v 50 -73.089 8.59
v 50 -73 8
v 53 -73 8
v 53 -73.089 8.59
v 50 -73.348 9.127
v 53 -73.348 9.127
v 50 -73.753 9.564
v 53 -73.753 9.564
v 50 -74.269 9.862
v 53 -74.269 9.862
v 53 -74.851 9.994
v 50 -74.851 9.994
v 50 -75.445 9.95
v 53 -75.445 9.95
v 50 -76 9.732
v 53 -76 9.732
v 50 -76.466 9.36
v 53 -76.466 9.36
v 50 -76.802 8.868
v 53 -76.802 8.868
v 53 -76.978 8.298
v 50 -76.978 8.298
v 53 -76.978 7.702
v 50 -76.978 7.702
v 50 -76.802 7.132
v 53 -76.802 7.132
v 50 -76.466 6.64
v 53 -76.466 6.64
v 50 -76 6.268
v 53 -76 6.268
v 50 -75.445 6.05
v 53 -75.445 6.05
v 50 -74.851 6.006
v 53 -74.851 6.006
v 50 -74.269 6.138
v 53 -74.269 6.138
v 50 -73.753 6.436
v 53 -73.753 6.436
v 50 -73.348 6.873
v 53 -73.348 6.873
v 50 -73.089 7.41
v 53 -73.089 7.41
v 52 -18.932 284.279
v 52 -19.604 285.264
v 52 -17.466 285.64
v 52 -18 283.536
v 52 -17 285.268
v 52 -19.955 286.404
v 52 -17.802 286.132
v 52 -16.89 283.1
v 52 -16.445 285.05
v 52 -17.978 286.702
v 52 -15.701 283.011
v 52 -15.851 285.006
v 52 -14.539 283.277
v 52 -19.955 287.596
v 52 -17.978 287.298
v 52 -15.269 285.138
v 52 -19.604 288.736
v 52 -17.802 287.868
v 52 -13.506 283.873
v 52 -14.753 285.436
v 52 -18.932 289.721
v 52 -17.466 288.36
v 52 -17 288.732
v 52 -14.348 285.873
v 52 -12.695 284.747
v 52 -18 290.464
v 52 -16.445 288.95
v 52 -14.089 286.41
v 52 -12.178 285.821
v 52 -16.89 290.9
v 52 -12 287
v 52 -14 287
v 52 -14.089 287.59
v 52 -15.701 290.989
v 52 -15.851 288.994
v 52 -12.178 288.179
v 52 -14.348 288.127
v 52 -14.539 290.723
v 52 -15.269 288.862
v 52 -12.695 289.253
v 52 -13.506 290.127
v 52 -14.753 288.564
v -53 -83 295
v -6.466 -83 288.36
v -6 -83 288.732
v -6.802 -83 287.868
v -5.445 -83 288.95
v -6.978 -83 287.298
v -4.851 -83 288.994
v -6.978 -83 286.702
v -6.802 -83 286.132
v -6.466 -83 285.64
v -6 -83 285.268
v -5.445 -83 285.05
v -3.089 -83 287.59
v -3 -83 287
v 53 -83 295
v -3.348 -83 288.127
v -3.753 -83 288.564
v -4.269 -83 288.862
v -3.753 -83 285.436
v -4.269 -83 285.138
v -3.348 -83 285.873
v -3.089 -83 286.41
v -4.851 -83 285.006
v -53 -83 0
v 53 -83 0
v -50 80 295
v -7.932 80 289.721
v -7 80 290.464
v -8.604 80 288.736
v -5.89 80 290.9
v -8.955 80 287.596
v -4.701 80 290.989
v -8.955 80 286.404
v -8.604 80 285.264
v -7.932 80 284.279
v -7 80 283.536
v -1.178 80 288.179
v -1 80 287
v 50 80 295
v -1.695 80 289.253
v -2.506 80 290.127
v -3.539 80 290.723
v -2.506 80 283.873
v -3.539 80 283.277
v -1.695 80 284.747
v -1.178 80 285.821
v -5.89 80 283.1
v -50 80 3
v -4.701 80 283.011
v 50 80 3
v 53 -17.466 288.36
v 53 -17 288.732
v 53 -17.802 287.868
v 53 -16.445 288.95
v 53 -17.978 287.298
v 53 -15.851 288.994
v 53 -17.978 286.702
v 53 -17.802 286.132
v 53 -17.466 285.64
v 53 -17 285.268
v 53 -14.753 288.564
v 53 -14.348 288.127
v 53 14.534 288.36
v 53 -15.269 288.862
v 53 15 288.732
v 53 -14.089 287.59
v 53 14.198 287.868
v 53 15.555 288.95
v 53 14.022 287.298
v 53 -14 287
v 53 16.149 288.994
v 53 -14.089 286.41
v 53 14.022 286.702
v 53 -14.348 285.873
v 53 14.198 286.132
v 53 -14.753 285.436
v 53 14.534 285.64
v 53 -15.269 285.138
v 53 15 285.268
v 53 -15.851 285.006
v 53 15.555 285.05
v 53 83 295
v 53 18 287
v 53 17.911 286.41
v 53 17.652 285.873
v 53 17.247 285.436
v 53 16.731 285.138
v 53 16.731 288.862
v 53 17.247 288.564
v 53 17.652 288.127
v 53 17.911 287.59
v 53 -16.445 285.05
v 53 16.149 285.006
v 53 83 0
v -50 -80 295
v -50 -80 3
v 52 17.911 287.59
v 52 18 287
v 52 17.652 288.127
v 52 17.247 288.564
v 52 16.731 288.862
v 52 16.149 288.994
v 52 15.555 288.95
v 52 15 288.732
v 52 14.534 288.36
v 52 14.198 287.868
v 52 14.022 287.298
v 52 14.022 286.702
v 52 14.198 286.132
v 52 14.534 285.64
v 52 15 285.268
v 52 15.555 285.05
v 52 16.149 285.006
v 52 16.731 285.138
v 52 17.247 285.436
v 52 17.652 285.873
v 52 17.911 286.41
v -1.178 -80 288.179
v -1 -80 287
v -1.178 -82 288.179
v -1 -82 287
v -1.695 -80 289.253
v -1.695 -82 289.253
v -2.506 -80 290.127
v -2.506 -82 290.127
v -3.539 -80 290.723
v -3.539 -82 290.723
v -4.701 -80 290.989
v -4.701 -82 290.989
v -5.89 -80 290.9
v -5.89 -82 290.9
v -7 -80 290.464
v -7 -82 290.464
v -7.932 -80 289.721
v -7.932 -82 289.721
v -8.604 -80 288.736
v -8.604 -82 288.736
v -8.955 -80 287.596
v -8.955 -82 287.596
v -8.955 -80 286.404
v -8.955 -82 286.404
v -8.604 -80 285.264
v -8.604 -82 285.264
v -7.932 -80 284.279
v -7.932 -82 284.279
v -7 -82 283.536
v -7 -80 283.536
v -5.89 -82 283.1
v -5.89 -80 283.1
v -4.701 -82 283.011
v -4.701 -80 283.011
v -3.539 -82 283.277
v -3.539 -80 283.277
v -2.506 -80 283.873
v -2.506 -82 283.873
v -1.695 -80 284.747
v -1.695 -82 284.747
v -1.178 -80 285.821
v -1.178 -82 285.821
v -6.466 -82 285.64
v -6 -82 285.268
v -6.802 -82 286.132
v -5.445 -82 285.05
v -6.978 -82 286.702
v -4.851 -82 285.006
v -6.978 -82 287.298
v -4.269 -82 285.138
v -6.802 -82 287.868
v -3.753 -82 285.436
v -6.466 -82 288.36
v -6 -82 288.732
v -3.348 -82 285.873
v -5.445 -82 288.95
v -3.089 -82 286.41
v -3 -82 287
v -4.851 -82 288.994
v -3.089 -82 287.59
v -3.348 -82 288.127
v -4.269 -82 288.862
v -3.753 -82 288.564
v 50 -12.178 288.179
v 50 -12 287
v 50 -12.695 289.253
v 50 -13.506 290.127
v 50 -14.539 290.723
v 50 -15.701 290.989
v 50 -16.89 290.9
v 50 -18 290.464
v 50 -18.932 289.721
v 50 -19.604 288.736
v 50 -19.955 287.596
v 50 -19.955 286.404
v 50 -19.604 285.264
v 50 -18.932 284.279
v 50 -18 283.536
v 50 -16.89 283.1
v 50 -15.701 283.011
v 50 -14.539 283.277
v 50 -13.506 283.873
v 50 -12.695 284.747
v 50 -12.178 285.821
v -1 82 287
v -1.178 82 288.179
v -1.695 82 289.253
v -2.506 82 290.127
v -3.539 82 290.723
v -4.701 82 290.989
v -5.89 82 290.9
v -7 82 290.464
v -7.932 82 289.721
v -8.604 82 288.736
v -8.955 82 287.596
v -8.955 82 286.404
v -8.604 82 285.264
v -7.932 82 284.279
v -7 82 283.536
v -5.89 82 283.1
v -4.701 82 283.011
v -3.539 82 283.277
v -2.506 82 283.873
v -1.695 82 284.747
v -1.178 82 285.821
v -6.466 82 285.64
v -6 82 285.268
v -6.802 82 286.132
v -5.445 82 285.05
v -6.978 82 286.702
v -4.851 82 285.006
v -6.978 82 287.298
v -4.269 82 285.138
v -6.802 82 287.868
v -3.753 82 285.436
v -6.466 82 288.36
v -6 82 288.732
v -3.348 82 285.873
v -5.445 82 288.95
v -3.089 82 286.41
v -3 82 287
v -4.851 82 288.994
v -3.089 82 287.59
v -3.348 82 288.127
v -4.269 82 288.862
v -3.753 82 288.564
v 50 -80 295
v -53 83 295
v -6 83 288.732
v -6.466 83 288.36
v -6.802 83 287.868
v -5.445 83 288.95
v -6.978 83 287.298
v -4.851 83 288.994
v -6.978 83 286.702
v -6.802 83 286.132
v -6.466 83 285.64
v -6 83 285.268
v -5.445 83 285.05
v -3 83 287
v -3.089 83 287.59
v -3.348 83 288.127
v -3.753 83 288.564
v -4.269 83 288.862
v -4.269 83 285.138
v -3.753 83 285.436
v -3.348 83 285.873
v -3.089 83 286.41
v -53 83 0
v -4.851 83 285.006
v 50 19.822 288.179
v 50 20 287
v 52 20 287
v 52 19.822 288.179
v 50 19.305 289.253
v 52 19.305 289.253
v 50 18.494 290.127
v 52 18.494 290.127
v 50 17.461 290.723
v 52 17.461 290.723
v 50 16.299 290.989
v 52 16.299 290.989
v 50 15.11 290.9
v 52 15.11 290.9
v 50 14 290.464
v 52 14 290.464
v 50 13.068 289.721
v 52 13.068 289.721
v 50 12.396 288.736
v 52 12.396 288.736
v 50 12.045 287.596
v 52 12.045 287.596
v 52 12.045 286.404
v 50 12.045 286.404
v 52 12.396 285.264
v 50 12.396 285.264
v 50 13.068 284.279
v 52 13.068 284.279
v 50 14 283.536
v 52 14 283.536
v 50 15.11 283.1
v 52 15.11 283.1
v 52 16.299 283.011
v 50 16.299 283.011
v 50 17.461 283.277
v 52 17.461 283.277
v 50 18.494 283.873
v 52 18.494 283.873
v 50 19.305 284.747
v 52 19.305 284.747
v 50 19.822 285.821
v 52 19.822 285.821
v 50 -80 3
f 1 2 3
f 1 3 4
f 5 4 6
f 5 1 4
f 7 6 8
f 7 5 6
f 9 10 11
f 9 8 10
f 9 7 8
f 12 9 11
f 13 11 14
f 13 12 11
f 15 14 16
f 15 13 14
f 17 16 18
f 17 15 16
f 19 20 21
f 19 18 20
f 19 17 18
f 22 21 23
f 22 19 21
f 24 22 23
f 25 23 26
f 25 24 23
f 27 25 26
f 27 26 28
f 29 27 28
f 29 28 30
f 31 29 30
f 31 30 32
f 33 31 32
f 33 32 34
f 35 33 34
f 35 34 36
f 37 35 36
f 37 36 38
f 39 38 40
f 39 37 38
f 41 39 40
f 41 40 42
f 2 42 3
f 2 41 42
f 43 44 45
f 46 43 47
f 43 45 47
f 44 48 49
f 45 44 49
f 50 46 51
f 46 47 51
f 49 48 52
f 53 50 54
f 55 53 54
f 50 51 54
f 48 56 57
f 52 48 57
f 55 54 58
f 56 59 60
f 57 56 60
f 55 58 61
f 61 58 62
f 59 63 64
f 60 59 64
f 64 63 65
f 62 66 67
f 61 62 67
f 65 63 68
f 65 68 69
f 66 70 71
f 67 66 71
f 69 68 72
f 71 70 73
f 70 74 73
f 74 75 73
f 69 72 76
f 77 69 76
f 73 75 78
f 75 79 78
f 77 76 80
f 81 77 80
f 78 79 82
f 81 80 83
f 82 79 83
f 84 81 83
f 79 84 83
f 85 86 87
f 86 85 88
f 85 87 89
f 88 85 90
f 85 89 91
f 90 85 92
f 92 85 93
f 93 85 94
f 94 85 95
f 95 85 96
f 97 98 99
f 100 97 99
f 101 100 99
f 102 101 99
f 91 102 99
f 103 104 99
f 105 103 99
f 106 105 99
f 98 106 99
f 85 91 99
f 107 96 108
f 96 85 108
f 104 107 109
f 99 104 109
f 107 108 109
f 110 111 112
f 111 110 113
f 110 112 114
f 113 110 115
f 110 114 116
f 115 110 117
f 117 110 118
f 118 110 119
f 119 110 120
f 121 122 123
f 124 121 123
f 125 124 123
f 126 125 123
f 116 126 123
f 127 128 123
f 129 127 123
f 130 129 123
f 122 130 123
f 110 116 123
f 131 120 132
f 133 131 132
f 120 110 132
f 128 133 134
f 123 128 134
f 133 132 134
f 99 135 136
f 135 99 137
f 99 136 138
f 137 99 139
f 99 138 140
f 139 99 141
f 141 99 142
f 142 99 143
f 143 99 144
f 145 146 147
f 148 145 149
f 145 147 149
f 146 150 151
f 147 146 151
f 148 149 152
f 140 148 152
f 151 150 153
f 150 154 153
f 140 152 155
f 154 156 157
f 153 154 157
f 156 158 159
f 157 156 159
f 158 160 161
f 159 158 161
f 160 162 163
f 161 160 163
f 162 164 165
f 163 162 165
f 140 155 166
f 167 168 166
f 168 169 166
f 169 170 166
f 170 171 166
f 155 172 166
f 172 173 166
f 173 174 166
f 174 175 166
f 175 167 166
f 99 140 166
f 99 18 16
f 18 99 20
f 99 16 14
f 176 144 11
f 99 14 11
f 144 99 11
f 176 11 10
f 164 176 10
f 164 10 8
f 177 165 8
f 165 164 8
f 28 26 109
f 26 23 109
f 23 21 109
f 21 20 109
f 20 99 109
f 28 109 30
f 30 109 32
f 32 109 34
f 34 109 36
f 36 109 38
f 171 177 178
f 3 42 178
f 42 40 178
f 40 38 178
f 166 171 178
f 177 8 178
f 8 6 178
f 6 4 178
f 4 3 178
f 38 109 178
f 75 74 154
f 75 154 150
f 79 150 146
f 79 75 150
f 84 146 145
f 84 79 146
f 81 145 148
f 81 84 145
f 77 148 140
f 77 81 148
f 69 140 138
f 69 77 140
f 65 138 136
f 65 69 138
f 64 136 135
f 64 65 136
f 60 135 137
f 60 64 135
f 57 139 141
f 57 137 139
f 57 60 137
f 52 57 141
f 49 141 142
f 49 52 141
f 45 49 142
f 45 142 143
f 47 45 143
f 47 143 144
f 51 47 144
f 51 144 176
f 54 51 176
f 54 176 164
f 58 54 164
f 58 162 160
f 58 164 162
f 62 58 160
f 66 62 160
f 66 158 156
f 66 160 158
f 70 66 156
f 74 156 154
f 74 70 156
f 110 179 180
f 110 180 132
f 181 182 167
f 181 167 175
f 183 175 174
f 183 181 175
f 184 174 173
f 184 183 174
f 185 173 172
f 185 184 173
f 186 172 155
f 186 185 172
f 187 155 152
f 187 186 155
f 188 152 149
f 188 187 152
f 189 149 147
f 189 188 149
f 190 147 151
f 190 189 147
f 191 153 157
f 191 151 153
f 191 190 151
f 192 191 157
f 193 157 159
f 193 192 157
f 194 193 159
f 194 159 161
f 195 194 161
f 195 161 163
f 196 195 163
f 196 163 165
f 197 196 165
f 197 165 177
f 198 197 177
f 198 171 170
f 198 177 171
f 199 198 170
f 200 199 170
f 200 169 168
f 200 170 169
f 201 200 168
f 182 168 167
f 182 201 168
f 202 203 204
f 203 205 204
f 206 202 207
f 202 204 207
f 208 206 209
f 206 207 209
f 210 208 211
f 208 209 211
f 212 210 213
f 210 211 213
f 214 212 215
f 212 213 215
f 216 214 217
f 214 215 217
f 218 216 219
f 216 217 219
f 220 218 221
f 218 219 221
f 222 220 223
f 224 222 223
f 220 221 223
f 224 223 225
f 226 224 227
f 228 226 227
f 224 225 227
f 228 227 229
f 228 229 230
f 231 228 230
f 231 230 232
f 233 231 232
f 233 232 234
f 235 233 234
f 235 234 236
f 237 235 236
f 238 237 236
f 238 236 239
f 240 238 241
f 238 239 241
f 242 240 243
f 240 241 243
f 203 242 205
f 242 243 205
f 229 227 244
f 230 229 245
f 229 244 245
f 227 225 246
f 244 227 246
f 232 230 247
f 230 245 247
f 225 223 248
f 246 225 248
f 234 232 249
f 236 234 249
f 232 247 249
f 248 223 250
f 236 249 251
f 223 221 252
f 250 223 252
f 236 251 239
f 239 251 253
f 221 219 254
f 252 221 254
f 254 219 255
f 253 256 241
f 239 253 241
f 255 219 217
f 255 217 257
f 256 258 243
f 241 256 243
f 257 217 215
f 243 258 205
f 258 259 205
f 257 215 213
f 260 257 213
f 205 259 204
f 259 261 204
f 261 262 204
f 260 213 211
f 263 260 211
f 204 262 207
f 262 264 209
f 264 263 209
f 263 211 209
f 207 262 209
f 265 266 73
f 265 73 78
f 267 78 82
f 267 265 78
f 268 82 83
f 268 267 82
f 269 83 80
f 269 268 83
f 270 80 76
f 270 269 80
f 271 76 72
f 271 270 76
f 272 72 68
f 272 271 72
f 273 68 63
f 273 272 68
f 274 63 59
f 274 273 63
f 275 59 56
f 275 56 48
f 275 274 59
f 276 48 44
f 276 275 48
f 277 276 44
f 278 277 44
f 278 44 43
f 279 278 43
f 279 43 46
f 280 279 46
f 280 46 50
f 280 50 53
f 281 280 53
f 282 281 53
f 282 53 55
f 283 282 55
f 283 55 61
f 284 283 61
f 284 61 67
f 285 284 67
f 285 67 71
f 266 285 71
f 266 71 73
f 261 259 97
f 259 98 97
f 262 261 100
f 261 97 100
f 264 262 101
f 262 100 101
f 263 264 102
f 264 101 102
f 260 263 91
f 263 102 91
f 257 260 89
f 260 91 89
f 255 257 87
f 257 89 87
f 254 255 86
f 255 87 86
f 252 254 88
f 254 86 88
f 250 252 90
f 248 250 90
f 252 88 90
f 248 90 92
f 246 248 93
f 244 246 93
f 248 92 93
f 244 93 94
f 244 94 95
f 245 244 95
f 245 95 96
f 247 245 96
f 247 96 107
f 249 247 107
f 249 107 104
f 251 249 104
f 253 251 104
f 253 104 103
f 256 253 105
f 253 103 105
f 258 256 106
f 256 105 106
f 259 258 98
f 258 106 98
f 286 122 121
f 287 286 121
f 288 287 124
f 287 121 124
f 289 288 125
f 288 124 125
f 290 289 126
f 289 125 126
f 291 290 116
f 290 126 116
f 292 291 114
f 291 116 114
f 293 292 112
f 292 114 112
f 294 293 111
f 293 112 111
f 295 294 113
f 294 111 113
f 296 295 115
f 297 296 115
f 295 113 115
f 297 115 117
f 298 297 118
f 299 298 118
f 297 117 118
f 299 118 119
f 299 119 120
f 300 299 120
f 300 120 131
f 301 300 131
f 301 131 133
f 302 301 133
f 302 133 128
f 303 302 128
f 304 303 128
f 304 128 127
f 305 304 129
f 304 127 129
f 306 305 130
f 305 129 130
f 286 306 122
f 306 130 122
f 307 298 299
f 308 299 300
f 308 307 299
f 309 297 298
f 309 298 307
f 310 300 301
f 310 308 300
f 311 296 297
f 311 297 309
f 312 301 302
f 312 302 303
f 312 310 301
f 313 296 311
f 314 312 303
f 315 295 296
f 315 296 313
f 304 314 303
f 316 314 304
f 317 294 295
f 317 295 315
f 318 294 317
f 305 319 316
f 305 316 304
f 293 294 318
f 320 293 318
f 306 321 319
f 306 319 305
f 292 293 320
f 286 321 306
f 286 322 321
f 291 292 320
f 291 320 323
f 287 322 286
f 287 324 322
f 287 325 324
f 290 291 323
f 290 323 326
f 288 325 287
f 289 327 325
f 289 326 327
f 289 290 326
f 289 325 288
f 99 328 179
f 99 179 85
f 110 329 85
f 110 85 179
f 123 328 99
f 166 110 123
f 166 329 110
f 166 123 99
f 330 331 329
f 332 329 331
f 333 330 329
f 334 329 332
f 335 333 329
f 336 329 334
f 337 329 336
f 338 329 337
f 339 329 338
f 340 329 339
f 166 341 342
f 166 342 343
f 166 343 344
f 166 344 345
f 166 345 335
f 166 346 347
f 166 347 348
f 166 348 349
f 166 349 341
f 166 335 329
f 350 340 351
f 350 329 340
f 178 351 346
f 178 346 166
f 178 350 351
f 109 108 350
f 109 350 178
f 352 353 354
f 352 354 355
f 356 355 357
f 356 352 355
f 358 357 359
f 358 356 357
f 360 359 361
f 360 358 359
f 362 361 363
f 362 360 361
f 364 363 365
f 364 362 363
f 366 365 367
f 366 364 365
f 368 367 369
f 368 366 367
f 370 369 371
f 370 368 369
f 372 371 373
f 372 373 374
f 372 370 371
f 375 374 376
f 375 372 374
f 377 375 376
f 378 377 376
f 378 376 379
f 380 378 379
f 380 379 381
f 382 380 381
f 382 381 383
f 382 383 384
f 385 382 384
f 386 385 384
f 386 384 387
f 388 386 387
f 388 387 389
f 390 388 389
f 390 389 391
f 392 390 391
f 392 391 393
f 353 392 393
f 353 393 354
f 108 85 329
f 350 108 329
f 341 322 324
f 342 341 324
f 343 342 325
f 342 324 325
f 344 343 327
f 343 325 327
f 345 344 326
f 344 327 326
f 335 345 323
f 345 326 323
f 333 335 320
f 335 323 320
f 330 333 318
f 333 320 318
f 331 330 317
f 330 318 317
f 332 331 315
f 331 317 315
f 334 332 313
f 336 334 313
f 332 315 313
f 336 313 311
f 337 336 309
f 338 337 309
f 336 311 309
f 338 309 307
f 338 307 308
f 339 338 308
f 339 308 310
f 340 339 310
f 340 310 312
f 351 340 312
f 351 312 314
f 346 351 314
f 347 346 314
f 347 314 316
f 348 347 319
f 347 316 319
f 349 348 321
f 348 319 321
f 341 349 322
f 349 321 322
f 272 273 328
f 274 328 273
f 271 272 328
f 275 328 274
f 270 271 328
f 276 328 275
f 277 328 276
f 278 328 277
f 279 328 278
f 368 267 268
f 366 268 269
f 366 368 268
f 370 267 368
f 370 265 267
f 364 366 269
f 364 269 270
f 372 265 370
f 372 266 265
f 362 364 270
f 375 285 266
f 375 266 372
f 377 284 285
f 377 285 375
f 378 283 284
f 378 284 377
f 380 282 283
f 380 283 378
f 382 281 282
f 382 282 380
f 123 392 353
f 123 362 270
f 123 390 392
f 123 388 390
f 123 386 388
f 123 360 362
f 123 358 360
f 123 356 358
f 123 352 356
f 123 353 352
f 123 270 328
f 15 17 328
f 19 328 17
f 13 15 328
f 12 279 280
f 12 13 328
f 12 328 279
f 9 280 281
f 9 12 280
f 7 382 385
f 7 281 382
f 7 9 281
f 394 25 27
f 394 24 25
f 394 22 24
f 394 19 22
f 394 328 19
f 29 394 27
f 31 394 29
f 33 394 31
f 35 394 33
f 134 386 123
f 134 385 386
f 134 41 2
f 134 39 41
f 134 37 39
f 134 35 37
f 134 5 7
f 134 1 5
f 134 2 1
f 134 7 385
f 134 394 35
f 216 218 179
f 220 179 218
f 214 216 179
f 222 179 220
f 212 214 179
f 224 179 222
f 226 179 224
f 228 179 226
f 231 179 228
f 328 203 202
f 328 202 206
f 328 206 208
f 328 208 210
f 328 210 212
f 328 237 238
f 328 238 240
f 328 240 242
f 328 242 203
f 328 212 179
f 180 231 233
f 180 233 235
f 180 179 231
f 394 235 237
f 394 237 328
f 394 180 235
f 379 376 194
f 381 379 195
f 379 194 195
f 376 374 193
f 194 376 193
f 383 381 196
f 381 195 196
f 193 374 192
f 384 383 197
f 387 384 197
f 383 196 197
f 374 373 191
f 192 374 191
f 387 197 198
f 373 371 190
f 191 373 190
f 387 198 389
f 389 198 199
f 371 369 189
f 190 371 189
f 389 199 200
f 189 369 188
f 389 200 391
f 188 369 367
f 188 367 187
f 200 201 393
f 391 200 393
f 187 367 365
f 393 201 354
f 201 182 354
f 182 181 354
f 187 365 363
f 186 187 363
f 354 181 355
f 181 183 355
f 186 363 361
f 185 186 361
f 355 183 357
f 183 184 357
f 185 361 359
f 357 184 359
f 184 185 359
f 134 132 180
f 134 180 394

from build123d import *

# Parameters (mm, degrees)
F0_W      = 106
F0_H      = 166
F1_DEPTH  = 295
F2_T      = -3
F3_R      = 2
F4_DEPTH  = 150
F5_R      = 2
F6_DEPTH  = 125
F7_R      = 4
F8_DEPTH  = 52
F9_R      = 4
F10_DEPTH = 82


with BuildPart() as f1:
    # F0 (on Top) → F1 (new body)
    with BuildSketch(Plane.XY):
        Rectangle(F0_W, F0_H)
    extrude(amount=F1_DEPTH)

    # F2
    f2_openings = [f1.faces().sort_by_distance(p)[0] for p in [
        (0, 0, 295),
    ]]
    offset(amount=F2_T, openings=f2_openings)

    # F3 (on Right) → F4 (cut)
    with BuildSketch(Plane.YZ):
        with Locations((-16, 287)):
            Circle(F3_R)
        with Locations((16, 287)):
            Circle(F3_R)
        with Locations((-75, 8)):
            Circle(F3_R)
    extrude(amount=F4_DEPTH, mode=Mode.SUBTRACT)

    # F5 (on Front) → F6 (cut, symmetric)
    with BuildSketch(Plane.XZ):
        with Locations((-5, 287)):
            Circle(F5_R)
    extrude(amount=F6_DEPTH, both=True, mode=Mode.SUBTRACT)

    # F7 (on Right) → F8 (cut)
    with BuildSketch(Plane.YZ):
        with Locations((-16, 287)):
            Circle(F7_R)
        with Locations((16, 287)):
            Circle(F7_R)
    extrude(amount=F8_DEPTH, mode=Mode.SUBTRACT)

    # F9 (on Front) → F10 (cut, symmetric)
    with BuildSketch(Plane.XZ):
        with Locations((-5, 287)):
            Circle(F9_R)
    extrude(amount=F10_DEPTH, both=True, mode=Mode.SUBTRACT)


solid = f1.part
